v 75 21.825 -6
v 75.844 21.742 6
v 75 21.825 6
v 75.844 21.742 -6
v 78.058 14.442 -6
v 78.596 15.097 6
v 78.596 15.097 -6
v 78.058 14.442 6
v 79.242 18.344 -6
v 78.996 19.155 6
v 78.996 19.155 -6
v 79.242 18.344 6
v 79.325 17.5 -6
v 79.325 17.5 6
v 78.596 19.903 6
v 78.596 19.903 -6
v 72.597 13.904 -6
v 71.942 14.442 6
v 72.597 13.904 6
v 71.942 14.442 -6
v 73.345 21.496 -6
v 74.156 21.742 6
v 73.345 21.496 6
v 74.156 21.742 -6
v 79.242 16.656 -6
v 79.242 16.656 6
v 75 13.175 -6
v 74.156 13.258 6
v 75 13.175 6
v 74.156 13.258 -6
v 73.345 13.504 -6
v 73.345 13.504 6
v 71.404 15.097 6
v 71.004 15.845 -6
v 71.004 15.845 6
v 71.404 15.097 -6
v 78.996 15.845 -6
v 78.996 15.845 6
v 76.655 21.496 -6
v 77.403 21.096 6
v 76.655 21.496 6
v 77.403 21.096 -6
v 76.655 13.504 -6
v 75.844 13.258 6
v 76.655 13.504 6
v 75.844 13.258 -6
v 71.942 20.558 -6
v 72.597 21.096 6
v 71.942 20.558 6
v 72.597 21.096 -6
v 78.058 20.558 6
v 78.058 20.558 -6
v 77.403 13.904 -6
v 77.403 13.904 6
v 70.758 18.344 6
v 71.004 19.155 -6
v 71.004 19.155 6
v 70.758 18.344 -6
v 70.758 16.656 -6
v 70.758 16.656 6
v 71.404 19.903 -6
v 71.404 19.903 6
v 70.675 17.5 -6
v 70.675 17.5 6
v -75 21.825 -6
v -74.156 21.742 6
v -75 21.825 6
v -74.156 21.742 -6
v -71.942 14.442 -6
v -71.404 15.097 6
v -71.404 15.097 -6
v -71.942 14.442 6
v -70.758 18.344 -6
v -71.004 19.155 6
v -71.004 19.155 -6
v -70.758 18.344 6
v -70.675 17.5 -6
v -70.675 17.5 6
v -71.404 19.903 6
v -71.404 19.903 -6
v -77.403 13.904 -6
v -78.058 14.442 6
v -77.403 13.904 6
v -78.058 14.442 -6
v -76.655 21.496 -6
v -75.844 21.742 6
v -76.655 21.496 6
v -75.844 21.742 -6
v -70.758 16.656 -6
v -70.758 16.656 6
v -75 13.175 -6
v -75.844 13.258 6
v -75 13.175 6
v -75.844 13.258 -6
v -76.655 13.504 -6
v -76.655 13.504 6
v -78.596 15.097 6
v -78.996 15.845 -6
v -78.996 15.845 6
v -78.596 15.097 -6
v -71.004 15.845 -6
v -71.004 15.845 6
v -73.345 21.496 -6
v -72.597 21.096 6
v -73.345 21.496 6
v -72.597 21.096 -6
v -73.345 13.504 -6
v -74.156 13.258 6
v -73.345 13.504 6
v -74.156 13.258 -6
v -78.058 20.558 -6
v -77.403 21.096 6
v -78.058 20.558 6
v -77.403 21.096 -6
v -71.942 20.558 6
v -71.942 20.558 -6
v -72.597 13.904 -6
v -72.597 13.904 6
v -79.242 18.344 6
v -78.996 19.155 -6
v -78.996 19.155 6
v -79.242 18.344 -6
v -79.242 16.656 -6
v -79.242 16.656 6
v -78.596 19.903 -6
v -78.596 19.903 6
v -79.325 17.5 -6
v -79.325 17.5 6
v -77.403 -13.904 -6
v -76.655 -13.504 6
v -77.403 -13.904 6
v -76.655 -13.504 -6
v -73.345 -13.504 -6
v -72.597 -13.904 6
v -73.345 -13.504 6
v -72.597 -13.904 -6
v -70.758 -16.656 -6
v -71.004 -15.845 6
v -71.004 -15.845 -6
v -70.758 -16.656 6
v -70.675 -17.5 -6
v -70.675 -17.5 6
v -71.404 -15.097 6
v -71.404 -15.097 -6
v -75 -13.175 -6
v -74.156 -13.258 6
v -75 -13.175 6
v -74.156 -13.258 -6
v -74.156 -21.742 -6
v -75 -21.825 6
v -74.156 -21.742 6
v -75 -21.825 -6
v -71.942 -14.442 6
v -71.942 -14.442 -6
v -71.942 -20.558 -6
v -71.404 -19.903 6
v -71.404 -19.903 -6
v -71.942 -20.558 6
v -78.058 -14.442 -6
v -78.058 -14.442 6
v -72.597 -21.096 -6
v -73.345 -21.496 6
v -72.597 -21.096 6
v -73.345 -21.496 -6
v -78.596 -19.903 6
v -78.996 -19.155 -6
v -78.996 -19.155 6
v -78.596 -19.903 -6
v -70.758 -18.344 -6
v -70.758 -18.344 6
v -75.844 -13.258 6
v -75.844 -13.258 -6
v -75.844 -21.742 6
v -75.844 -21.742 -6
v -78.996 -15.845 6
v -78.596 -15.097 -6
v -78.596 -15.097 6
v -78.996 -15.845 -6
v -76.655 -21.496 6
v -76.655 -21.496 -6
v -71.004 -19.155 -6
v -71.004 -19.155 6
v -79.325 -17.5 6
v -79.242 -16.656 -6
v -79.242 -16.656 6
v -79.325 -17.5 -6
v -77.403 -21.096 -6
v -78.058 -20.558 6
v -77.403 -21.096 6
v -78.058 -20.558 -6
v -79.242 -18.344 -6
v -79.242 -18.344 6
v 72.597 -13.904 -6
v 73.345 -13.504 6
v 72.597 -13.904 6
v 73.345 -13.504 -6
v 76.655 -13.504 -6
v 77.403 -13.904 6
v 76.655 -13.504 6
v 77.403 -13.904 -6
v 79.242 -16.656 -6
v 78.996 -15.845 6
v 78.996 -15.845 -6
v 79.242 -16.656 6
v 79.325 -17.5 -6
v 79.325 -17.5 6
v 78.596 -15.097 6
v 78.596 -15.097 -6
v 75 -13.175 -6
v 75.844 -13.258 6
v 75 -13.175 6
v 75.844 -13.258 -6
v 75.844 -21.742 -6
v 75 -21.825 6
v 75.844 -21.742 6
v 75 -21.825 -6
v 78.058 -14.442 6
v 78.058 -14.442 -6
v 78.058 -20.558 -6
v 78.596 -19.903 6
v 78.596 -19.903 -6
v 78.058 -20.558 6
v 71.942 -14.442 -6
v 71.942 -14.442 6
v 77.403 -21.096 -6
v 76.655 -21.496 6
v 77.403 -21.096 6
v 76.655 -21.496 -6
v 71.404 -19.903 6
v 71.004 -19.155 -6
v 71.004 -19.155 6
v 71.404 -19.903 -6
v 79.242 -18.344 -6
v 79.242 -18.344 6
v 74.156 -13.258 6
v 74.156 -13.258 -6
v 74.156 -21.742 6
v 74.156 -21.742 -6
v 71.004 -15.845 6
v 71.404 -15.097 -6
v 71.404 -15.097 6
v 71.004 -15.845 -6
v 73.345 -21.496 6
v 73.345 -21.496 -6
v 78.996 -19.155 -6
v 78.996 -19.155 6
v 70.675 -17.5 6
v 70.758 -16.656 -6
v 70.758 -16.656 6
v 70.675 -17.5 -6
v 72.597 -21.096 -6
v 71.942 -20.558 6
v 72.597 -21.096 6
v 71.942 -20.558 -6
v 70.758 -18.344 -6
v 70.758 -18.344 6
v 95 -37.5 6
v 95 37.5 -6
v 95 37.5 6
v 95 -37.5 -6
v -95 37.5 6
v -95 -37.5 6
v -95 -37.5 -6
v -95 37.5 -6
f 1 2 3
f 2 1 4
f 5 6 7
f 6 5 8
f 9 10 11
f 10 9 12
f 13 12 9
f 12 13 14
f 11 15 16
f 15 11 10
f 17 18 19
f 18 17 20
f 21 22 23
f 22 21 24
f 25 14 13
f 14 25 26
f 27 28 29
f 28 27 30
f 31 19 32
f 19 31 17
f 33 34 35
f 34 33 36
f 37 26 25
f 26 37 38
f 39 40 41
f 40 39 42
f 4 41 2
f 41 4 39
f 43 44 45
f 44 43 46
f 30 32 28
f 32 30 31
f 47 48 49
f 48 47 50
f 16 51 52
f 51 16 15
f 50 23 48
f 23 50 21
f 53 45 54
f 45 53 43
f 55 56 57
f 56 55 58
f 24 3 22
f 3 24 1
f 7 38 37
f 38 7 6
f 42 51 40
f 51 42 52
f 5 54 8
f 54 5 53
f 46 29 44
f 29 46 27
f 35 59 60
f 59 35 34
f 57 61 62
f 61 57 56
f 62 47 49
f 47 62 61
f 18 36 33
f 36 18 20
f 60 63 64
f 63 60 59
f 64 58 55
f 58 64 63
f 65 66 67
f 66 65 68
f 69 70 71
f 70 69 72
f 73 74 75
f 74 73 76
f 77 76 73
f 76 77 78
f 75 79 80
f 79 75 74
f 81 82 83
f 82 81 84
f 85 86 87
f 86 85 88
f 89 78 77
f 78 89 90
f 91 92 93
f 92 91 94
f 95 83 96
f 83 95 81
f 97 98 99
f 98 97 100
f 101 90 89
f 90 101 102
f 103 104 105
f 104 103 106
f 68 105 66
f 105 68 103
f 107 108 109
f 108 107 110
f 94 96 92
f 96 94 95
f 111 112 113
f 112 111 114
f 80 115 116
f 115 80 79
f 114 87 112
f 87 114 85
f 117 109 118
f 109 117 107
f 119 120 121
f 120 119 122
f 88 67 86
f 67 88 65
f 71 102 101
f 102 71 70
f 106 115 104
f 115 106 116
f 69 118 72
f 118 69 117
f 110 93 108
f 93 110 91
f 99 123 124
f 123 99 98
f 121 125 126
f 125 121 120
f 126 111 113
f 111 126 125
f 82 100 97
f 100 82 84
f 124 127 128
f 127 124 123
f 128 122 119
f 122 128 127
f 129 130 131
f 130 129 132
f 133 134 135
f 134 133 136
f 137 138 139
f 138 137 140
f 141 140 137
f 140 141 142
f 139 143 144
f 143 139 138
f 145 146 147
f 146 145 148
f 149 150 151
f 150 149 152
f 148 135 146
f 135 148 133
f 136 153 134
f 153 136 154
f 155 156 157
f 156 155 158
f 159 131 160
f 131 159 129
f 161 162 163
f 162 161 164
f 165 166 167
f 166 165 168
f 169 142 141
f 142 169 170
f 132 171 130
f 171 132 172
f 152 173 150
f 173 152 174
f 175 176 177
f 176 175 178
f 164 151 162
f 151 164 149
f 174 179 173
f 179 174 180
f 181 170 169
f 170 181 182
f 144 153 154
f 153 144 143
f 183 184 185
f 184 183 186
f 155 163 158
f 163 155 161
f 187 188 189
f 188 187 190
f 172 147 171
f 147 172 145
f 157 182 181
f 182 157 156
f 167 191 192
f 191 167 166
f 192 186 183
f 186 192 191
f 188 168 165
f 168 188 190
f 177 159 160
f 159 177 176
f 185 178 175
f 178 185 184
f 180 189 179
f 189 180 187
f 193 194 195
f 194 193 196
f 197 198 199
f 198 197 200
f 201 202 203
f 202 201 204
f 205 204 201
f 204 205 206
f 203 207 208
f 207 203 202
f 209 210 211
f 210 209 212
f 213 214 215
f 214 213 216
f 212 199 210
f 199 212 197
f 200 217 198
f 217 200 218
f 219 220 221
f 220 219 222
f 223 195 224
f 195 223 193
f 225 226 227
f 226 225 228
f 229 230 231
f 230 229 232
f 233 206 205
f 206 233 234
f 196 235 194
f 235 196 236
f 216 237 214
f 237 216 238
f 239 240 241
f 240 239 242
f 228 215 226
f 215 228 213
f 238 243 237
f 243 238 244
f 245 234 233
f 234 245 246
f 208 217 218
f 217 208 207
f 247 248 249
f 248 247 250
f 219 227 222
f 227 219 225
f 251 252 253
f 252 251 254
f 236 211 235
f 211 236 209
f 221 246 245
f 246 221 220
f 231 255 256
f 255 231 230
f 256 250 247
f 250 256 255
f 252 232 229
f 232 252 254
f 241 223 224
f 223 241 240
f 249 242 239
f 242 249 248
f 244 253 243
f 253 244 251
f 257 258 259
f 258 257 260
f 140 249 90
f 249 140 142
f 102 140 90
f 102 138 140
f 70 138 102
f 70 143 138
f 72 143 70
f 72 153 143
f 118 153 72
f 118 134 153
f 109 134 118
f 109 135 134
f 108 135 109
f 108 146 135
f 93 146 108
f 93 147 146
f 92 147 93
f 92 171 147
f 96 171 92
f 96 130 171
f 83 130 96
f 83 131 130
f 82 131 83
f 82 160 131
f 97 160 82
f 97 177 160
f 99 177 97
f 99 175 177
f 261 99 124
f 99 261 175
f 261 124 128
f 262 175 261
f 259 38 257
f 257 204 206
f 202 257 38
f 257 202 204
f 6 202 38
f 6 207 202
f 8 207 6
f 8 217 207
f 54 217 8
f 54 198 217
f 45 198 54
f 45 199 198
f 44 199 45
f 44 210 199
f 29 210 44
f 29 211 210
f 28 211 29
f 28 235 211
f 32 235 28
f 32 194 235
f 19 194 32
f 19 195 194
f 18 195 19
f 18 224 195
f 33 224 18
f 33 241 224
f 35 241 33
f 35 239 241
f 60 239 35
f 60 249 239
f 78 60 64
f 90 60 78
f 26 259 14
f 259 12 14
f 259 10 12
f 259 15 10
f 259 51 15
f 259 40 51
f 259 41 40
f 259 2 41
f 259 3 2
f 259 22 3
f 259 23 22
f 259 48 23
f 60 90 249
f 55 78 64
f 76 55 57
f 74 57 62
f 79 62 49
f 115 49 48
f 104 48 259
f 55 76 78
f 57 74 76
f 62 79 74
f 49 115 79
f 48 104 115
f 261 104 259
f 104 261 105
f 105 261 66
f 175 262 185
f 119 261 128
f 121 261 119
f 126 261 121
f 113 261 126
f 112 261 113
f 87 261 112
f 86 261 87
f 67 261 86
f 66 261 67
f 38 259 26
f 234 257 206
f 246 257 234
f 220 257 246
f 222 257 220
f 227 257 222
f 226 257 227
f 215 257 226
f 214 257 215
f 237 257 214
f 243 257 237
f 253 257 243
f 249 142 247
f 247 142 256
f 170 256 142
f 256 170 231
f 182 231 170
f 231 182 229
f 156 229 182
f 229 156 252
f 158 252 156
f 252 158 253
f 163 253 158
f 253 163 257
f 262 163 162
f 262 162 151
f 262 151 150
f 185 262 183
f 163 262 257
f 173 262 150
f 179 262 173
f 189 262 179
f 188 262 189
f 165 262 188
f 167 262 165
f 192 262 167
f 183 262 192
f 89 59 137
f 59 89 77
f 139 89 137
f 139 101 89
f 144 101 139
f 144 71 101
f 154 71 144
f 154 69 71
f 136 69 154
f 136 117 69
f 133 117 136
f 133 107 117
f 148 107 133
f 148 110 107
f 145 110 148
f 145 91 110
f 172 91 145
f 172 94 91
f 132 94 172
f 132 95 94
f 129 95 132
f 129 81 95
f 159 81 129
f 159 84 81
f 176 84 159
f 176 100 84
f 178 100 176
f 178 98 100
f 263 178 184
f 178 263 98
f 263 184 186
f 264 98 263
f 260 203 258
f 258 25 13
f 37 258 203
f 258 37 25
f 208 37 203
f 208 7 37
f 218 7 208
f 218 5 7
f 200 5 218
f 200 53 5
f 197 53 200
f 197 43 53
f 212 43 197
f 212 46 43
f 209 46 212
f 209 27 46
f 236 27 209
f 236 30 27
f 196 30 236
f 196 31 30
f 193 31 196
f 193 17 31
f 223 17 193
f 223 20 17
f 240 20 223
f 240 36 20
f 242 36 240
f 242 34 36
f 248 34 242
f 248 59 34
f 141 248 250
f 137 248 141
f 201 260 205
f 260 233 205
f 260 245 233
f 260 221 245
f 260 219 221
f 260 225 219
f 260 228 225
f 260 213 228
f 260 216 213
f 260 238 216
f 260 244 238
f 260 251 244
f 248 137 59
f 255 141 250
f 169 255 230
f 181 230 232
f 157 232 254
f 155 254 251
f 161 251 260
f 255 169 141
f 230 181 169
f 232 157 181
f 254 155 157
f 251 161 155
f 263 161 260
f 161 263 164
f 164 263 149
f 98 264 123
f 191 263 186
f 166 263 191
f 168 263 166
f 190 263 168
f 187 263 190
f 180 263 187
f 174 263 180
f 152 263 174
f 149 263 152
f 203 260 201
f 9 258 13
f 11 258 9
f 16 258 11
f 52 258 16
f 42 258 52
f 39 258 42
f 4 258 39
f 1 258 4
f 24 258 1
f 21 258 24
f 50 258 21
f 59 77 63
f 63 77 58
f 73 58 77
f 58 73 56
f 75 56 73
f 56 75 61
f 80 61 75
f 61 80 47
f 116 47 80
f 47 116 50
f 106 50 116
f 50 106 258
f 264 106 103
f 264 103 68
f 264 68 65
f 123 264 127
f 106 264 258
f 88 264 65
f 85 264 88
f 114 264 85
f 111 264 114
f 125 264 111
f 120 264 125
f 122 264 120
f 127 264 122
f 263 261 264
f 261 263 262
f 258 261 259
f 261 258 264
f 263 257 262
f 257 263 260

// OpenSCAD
$fn = 32;

// ----------------------------------------------------------------------
// Corner plate 190 x 75 x 12
// 4 holes, centres taken from the edge offset
// ----------------------------------------------------------------------

// --- parameters (mm) ---
plate = [190, 75, 12];   // overall size (x, y, z)
holes = 4;               // number of holes the drawing asks for
bore_d = 8.4;            // nominal hole diameter from the drawing
print_allowance = 0.25;  // clearance added for printing
edge = 20;               // hole centre offset from the plate edge

// --- derived feature positions (mm) ---
hole_d = bore_d + print_allowance;  // = 8.65   hole diameter as printed
corner_x = plate[0] / 2 - edge;     // = 75   corner hole X
corner_y = plate[1] / 2 - edge;     // = 17.5   corner hole Y
feature_centers = [
  [corner_x, corner_y],
  [-corner_x, corner_y],
  [-corner_x, -corner_y],
  [corner_x, -corner_y]
];   // hole centres the loop below drills

// plate outline, every hole drilled through with the same cutters
difference() {
  cube(plate, center = true);
  for (centre = feature_centers)
    translate([centre[0], centre[1], 0])
      cylinder(d = hole_d, h = plate[2] + 2, center = true);
}
